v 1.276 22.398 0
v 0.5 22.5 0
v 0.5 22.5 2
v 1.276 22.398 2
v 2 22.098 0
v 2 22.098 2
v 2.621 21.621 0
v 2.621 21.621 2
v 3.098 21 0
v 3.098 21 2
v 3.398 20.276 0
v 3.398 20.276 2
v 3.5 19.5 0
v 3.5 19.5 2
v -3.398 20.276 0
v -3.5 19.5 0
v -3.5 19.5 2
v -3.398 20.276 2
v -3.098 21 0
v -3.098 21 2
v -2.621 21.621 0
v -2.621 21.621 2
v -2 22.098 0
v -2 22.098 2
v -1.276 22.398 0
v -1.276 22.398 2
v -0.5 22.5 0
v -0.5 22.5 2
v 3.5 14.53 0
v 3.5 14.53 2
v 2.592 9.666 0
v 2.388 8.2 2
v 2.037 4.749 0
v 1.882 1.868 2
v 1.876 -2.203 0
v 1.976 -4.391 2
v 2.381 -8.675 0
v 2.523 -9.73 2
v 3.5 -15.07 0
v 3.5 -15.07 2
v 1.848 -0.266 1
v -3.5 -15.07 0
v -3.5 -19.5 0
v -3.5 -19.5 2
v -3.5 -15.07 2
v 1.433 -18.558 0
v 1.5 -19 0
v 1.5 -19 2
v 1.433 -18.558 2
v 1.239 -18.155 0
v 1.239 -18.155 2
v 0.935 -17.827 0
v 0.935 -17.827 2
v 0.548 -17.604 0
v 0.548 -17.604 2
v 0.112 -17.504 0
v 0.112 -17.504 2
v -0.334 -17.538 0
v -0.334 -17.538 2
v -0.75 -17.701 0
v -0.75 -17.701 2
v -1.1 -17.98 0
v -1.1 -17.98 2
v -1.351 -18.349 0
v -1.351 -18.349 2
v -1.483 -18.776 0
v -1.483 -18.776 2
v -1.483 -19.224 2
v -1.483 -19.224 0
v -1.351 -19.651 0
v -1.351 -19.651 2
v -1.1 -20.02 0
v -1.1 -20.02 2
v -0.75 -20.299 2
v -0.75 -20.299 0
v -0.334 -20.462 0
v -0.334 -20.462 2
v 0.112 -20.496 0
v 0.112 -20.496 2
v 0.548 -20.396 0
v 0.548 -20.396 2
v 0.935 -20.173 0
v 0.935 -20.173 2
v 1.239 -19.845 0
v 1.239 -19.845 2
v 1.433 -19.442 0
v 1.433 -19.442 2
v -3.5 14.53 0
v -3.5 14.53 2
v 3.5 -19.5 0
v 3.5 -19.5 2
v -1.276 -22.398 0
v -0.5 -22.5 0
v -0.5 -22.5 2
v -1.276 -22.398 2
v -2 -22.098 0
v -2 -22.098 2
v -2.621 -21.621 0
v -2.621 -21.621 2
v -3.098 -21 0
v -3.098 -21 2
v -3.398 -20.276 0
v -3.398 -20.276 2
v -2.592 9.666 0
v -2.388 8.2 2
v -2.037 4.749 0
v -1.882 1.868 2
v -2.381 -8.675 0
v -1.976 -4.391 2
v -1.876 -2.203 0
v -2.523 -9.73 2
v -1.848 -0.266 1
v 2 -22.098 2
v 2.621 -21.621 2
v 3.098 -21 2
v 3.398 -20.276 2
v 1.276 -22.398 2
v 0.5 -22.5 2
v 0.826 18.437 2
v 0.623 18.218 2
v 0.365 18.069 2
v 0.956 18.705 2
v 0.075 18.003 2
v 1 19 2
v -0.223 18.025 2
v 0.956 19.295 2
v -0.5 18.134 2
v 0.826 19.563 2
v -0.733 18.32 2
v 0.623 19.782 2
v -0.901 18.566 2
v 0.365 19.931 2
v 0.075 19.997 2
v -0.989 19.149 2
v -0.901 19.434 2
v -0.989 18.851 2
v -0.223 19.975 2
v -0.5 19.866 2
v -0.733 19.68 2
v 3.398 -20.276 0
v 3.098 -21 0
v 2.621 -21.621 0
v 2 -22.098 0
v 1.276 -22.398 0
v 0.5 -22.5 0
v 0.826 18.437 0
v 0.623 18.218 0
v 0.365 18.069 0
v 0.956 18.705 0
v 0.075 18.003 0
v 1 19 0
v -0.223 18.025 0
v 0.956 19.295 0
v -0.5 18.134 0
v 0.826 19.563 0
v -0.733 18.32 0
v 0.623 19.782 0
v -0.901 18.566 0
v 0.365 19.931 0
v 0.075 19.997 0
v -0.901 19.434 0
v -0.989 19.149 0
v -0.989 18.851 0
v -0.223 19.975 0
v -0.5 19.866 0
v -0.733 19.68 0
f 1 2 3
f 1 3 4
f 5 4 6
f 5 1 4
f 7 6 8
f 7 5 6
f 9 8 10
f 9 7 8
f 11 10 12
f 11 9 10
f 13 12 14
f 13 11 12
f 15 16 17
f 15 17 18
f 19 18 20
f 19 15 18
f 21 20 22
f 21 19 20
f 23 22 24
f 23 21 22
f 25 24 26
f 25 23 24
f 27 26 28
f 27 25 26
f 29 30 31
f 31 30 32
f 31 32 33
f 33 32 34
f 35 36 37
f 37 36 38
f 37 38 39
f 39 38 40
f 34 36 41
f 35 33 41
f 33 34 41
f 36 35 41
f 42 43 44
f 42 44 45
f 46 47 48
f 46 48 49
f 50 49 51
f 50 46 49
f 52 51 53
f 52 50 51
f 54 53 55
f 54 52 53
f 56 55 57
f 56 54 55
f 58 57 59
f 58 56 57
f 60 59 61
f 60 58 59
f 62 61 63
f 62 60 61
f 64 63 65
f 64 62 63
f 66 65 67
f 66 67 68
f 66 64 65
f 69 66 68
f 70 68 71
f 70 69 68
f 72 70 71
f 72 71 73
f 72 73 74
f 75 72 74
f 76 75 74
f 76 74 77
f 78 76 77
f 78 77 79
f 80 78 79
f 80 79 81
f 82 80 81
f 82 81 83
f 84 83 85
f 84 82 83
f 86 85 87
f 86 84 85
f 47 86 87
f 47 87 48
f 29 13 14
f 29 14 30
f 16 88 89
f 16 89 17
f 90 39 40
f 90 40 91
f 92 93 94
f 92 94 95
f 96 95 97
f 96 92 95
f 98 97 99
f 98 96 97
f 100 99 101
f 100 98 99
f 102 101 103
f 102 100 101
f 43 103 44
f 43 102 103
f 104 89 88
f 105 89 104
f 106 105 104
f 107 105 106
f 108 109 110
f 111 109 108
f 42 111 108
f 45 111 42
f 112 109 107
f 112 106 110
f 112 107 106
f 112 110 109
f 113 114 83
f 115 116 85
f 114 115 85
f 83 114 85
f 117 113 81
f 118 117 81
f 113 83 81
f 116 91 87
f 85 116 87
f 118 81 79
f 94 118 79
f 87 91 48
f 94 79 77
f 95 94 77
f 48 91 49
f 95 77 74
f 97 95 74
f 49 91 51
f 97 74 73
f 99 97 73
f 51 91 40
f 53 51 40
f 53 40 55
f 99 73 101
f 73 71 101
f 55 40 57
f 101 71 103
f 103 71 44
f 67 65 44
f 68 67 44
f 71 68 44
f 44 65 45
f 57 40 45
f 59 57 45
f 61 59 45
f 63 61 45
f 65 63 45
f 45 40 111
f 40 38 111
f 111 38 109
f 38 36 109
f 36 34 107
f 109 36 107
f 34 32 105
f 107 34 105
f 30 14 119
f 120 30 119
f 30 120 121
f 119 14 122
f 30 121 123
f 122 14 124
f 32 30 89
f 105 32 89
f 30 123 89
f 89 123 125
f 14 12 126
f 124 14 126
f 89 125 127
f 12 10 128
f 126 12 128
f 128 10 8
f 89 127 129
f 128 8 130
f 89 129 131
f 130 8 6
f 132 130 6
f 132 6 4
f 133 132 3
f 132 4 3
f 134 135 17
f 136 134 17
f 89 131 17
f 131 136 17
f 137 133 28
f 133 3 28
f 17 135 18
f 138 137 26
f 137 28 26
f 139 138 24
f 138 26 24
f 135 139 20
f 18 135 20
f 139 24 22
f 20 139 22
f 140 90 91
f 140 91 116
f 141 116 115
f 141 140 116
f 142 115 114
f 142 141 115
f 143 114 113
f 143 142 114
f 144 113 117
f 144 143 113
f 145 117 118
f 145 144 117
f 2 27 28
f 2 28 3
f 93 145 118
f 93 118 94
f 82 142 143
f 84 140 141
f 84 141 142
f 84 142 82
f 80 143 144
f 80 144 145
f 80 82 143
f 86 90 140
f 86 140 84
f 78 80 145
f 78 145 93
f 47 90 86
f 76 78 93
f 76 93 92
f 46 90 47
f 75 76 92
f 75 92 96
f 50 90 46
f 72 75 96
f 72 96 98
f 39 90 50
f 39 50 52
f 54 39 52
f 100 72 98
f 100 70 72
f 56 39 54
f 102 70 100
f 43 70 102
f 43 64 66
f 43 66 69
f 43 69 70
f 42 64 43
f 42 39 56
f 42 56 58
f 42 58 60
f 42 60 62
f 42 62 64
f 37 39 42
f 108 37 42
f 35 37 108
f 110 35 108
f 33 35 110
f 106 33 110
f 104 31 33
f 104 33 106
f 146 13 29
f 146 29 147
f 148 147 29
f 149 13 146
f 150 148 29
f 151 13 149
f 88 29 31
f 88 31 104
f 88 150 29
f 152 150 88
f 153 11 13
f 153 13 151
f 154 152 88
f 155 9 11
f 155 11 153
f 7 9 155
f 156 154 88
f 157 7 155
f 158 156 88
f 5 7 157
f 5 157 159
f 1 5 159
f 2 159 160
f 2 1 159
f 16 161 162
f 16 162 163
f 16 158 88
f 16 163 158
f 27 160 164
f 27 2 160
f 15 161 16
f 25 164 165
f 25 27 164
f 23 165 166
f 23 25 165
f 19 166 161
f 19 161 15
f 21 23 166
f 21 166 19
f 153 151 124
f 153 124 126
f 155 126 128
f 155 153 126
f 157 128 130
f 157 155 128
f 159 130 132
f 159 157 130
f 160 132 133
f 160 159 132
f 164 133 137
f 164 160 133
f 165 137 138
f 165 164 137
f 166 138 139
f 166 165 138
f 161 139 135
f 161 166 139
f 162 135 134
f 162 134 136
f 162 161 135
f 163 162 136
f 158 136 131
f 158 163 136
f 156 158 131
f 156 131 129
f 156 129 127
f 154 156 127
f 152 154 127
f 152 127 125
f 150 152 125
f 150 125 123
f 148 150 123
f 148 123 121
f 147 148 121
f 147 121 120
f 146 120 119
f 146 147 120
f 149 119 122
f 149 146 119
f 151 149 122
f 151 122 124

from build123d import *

# Parameters (mm, degrees)
SKETCH1_R           = 1
SKETCH1_R_2         = 1.5
BOSS_EXTRUDE1_DEPTH = 2
CUT_EXTRUDE1_DEPTH  = 14


with BuildPart() as part:
    # Sketch1 → Boss-Extrude1 (new body)
    with BuildSketch(Plane.XY):
        with BuildLine():
            Line((-0.5, 22.5), (0.5, 22.5))
            ThreePointArc((0.5, 22.5), (2.621320344, 21.621320344), (3.5, 19.5))
            Line((3.5, 19.5), (3.5, -19.5))
            ThreePointArc((3.5, -19.5), (2.621320344, -21.621320344), (0.5, -22.5))
            Line((0.5, -22.5), (-0.5, -22.5))
            ThreePointArc((-0.5, -22.5), (-2.621320344, -21.621320344), (-3.5, -19.5))
            Line((-3.5, -19.5), (-3.5, 19.5))
            ThreePointArc((-3.5, 19.5), (-2.621320344, 21.621320344), (-0.5, 22.5))
        make_face()
        with Locations((0, 19)):
            Circle(SKETCH1_R, mode=Mode.SUBTRACT)
        with Locations((0, -19)):
            Circle(SKETCH1_R_2, mode=Mode.SUBTRACT)
    extrude(amount=BOSS_EXTRUDE1_DEPTH)

    # Sketch2 → Cut-Extrude1 (cut)
    with BuildSketch(Plane.XY.offset(2)):
        with BuildLine():
            Line((-3.5, 14.530463873), (-3.5, -15.069881222))
            add(Edge.make_bspline(
                [(-3.5, 14.530463873), (-0.195046467, -0.263066887), (-3.5, -15.069881222)],
                knots=[0, 0, 0, 1, 1, 1], degree=2))
        make_face()
        with BuildLine():
            add(Edge.make_bspline(
                [(3.5, 14.530463873), (0.195046467, -0.263066887), (3.5, -15.069881222)],
                knots=[0, 0, 0, 1, 1, 1], degree=2))
            Line((3.5, -15.069881222), (3.5, 14.530463873))
        make_face()
    extrude(amount=-CUT_EXTRUDE1_DEPTH, mode=Mode.SUBTRACT)


solid = part.part
